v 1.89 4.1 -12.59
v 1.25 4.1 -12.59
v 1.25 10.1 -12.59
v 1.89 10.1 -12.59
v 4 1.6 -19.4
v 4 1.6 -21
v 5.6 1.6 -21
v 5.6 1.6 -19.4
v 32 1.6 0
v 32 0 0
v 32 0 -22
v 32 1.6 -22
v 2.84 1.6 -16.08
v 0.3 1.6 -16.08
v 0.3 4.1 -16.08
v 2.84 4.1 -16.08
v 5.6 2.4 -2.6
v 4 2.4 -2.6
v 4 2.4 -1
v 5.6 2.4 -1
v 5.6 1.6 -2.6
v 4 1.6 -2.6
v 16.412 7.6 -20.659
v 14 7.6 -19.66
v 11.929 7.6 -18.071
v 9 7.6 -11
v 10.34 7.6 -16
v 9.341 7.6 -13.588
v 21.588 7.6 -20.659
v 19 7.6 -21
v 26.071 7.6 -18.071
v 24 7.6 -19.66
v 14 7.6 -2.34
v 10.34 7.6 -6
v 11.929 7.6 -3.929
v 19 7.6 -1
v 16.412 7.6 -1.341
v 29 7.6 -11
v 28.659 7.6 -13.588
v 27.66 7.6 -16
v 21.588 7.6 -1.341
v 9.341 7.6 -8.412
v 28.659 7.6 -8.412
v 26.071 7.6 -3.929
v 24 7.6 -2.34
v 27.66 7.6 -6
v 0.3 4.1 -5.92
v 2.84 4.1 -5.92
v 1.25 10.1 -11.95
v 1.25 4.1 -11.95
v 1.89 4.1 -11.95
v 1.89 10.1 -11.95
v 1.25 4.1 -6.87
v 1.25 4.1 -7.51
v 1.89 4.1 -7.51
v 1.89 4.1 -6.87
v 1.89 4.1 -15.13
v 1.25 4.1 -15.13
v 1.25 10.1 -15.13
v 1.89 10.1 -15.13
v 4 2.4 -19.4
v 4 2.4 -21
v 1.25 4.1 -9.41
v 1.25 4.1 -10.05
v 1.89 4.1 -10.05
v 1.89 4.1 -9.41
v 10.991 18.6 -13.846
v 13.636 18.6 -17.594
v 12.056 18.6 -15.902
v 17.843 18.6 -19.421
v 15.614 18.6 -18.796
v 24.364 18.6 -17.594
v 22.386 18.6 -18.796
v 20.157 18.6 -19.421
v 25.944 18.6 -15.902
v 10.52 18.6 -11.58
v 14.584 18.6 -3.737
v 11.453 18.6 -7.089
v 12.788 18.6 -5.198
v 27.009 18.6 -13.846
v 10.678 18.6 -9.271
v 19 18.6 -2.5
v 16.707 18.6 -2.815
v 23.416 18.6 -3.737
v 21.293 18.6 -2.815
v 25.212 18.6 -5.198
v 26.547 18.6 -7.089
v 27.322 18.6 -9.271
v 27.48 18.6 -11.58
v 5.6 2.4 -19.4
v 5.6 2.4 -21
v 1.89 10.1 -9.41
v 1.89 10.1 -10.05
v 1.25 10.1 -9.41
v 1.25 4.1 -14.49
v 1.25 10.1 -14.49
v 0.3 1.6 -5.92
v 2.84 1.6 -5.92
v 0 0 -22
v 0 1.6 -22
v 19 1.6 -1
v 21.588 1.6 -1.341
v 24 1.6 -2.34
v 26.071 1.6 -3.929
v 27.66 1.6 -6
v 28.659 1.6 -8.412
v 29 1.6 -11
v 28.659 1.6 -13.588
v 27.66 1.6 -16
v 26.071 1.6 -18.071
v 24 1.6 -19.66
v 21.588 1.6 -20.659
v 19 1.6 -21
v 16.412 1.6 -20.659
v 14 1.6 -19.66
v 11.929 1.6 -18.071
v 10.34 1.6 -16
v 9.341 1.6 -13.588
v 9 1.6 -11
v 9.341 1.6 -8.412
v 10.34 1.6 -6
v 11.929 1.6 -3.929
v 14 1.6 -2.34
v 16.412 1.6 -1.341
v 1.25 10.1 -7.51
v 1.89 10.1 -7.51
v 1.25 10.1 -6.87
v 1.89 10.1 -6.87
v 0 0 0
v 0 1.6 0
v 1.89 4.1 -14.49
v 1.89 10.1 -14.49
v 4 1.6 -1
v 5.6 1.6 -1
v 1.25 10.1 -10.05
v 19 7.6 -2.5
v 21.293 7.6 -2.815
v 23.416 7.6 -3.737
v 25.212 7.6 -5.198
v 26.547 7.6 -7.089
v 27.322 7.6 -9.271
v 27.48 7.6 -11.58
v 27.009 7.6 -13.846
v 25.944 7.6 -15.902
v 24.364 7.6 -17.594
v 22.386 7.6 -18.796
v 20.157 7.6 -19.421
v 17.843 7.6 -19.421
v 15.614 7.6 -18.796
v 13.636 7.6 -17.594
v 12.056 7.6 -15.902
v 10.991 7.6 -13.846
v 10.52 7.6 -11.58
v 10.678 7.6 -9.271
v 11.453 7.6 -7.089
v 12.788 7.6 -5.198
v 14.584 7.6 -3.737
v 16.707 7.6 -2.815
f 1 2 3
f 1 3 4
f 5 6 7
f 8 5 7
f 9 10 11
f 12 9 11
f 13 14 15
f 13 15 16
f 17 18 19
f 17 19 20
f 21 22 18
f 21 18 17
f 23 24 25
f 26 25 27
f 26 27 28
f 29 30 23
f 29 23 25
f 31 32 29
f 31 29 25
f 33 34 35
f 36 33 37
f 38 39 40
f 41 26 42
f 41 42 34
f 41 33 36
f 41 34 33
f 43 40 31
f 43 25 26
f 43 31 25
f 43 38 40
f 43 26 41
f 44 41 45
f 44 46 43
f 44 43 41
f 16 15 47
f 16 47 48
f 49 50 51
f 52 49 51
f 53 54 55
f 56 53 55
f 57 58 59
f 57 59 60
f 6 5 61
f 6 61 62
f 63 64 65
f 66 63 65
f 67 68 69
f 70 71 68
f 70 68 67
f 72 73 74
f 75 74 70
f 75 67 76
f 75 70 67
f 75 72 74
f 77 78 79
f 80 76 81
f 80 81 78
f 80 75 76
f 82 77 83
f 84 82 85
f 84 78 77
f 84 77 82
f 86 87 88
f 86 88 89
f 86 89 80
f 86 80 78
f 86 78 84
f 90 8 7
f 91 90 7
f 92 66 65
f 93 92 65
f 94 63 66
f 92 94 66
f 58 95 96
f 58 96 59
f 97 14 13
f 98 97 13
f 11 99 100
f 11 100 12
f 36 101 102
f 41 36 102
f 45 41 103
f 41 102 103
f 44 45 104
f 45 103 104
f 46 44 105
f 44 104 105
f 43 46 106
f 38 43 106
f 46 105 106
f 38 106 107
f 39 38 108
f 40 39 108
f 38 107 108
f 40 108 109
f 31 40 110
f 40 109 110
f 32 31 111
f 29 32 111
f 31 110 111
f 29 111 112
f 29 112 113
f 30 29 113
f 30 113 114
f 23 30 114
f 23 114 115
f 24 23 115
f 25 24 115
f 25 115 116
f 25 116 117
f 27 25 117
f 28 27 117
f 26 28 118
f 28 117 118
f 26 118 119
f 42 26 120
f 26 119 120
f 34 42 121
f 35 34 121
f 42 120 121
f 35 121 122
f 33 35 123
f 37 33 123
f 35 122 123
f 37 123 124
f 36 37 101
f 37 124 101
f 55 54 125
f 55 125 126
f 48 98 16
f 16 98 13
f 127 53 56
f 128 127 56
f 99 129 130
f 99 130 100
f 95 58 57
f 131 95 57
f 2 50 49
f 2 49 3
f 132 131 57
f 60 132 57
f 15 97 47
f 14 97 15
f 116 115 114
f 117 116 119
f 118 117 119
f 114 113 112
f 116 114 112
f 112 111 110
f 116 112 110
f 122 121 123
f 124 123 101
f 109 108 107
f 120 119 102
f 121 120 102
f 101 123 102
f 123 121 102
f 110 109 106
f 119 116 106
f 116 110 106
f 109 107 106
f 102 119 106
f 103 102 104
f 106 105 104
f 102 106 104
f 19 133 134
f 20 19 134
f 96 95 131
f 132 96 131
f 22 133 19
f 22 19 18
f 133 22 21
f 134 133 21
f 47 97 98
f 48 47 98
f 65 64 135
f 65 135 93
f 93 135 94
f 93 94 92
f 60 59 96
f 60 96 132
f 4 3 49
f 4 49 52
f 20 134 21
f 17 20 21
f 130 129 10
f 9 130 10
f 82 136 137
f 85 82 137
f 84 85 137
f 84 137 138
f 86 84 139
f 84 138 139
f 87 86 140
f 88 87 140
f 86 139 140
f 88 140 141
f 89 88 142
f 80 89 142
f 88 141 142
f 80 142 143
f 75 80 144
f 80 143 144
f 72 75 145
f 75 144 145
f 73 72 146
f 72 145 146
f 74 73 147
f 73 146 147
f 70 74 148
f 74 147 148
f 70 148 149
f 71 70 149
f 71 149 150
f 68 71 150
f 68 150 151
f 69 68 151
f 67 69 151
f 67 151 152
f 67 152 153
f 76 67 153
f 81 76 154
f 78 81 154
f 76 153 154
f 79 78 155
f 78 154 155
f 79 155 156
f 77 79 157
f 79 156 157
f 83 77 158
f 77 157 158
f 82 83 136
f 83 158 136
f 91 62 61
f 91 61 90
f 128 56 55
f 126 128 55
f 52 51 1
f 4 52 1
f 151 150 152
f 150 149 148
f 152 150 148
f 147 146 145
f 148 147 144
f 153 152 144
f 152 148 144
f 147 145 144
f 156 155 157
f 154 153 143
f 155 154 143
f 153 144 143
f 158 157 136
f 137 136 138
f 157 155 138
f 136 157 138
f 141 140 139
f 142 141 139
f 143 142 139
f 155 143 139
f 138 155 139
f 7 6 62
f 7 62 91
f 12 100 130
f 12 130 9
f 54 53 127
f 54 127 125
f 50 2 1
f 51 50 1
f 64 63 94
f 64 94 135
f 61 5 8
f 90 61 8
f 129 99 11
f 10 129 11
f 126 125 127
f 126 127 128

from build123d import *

# Parameters (mm, degrees)
SK_PCB_W            = 32
SK_PCB_H            = 22
PCB_DEPTH           = 1.6
SENSOR_START        = 1.6
SK_SENSOR_BASE_R    = 10
SENSOR_BASE_DEPTH   = 6
SENSOR_START_2      = 7.6
SK_SENSOR_MESH_R    = 8.5
SENSOR_MESH_DEPTH   = 11
HEADER_START        = 1.6
SK_HEADER_4_PIN_W   = 2.54
SK_HEADER_4_PIN_H   = 10.16
HEADER_4_PIN_DEPTH  = 2.5
HEADER_START_2      = 4.1
SK_HEADER_PINS_W    = 0.64
SK_HEADER_PINS_H    = 0.64
HEADER_PINS_DEPTH   = 6
HEADER_PINS_2_DEPTH = 6
HEADER_PINS_3_DEPTH = 6
HEADER_PINS_4_DEPTH = 6
LEDS_START          = 1.6
SK_LEDS_W           = 1.6
SK_LEDS_H           = 1.6
LEDS_DEPTH          = 0.8
LEDS_2_DEPTH        = 0.8


with BuildPart() as part:
    # SK PCB → PCB (new body)
    with BuildSketch(Plane(origin=(0, 0, 0), x_dir=(1, 0, 0), z_dir=(0, 1, 0))):
        with Locations((16, 11)):
            Rectangle(SK_PCB_W, SK_PCB_H)
    extrude(amount=PCB_DEPTH)


with BuildPart() as body_2:
    # SK Sensor base → Sensor base (new body)
    with BuildSketch(Plane(origin=(0, 0, 0), x_dir=(1, 0, 0), z_dir=(0, 1, 0)).offset(SENSOR_START)):
        with Locations(Location((19, 11, 0), (0, 0, 270))):
            Circle(SK_SENSOR_BASE_R)
    extrude(amount=SENSOR_BASE_DEPTH)


with BuildPart() as body_3:
    # SK Sensor mesh → Sensor mesh (new body)
    with BuildSketch(Plane(origin=(0, 0, 0), x_dir=(1, 0, 0), z_dir=(0, 1, 0)).offset(SENSOR_START_2)):
        with Locations(Location((19, 11, 0), (0, 0, 270))):
            Circle(SK_SENSOR_MESH_R)
    extrude(amount=SENSOR_MESH_DEPTH)


with BuildPart() as body_4:
    # SK Header 4 pin → Header 4 pin (new body)
    with BuildSketch(Plane(origin=(0, 0, 0), x_dir=(1, 0, 0), z_dir=(0, 1, 0)).offset(HEADER_START)):
        with Locations((1.57, 11)):
            Rectangle(SK_HEADER_4_PIN_W, SK_HEADER_4_PIN_H)
    extrude(amount=HEADER_4_PIN_DEPTH)


with BuildPart() as body_5:
    # SK Header pins → Header pins (new body)
    with BuildSketch(Plane(origin=(0, 0, 0), x_dir=(1, 0, 0), z_dir=(0, 1, 0)).offset(HEADER_START_2)):
        with Locations((1.57, 14.81)):
            Rectangle(SK_HEADER_PINS_W, SK_HEADER_PINS_H)
    extrude(amount=HEADER_PINS_DEPTH)


with BuildPart() as body_6:
    # SK Header pins → Header pins 2 (new body)
    with BuildSketch(Plane(origin=(0, 0, 0), x_dir=(1, 0, 0), z_dir=(0, 1, 0)).offset(HEADER_START_2)):
        with Locations((1.57, 12.27)):
            Rectangle(SK_HEADER_PINS_W, SK_HEADER_PINS_H)
    extrude(amount=HEADER_PINS_2_DEPTH)


with BuildPart() as body_7:
    # SK Header pins → Header pins 3 (new body)
    with BuildSketch(Plane(origin=(0, 0, 0), x_dir=(1, 0, 0), z_dir=(0, 1, 0)).offset(HEADER_START_2)):
        with Locations((1.57, 9.73)):
            Rectangle(SK_HEADER_PINS_W, SK_HEADER_PINS_H)
    extrude(amount=HEADER_PINS_3_DEPTH)


with BuildPart() as body_8:
    # SK Header pins → Header pins 4 (new body)
    with BuildSketch(Plane(origin=(0, 0, 0), x_dir=(1, 0, 0), z_dir=(0, 1, 0)).offset(HEADER_START_2)):
        with Locations((1.57, 7.19)):
            Rectangle(SK_HEADER_PINS_W, SK_HEADER_PINS_H)
    extrude(amount=HEADER_PINS_4_DEPTH)


with BuildPart() as body_9:
    # SK LEDs → LEDs (new body)
    with BuildSketch(Plane(origin=(0, 0, 0), x_dir=(1, 0, 0), z_dir=(0, 1, 0)).offset(LEDS_START)):
        with Locations((4.8, 20.2)):
            Rectangle(SK_LEDS_W, SK_LEDS_H)
    extrude(amount=LEDS_DEPTH)


with BuildPart() as body_10:
    # SK LEDs → LEDs 2 (new body)
    with BuildSketch(Plane(origin=(0, 0, 0), x_dir=(1, 0, 0), z_dir=(0, 1, 0)).offset(LEDS_START)):
        with Locations((4.8, 1.8)):
            Rectangle(SK_LEDS_W, SK_LEDS_H)
    extrude(amount=LEDS_2_DEPTH)


solid = Compound([part.part, body_2.part, body_3.part, body_4.part, body_5.part, body_6.part, body_7.part, body_8.part, body_9.part, body_10.part])
